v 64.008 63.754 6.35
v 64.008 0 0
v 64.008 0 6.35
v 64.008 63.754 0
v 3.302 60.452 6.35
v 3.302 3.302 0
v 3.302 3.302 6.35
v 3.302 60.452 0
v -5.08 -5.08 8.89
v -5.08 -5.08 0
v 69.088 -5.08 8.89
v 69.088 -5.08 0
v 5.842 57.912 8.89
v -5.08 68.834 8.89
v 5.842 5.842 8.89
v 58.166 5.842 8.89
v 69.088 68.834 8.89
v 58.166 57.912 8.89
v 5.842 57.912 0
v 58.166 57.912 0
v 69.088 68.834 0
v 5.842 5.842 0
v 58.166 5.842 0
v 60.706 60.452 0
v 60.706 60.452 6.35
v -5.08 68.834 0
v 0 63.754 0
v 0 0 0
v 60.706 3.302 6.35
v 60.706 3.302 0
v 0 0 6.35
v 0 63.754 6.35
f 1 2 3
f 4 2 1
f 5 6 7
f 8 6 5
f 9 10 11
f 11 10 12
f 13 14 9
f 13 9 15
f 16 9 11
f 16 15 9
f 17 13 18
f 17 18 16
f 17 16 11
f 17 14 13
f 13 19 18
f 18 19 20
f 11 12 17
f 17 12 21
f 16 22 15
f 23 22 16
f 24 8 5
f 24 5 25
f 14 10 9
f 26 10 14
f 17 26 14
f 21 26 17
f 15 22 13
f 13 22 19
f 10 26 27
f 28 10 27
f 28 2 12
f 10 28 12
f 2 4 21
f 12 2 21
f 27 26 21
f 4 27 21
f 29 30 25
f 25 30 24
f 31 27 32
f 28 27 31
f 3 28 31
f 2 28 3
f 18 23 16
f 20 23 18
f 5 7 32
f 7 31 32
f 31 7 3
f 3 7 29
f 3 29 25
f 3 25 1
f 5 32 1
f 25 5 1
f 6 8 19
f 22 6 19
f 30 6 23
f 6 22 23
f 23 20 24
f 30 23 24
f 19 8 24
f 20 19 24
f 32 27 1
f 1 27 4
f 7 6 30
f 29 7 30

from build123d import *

# Parameters (mm, degrees)
SKETCH1_W             = 57.404
SKETCH1_H             = 57.15
SKETCH1_W_2           = 52.324
SKETCH1_H_2           = 52.07
BOSS_EXTRUDE1_DEPTH   = 6.35
SKETCH1_W_3           = 74.168
SKETCH1_H_3           = 73.914
BOSS_EXTRUDE1_2_DEPTH = 6.35
SKETCH2_W             = 74.168
SKETCH2_H             = 73.914
SKETCH2_W_2           = 52.324
SKETCH2_H_2           = 52.07
BOSS_EXTRUDE2_DEPTH   = 2.54


with BuildPart() as part:
    # Sketch1 → Boss-Extrude1 (new body)
    with BuildSketch(Plane.XY):
        with Locations((32.004, 31.877)):
            Rectangle(SKETCH1_W, SKETCH1_H)
        with Locations((32.004, 31.877)):
            Rectangle(SKETCH1_W_2, SKETCH1_H_2, mode=Mode.SUBTRACT)
    extrude(amount=BOSS_EXTRUDE1_DEPTH)



with BuildPart() as body_2:
    # Sketch1 → Boss-Extrude1 2 (new body)
    with BuildSketch(Plane.XY):
        with Locations((32.004, 31.877)):
            Rectangle(SKETCH1_W_3, SKETCH1_H_3)
        Polygon((0, 0), (64.008, 0), (64.008, 63.754), (60.706, 63.754), (3.302, 63.754), (0, 63.754), align=None, mode=Mode.SUBTRACT)
    extrude(amount=BOSS_EXTRUDE1_2_DEPTH)


with BuildPart() as part_1:
    add(part.part)

    add(body_2.part)  # Boss-Extrude2 merges body 2
    # Sketch2 → Boss-Extrude2 (add)
    with BuildSketch(Plane.XY.offset(6.35)):
        with Locations((32.004, 31.877)):
            Rectangle(SKETCH2_W, SKETCH2_H)
        with Locations((32.004, 31.877)):
            Rectangle(SKETCH2_W_2, SKETCH2_H_2, mode=Mode.SUBTRACT)
    extrude(amount=BOSS_EXTRUDE2_DEPTH)


solid = part_1.part
